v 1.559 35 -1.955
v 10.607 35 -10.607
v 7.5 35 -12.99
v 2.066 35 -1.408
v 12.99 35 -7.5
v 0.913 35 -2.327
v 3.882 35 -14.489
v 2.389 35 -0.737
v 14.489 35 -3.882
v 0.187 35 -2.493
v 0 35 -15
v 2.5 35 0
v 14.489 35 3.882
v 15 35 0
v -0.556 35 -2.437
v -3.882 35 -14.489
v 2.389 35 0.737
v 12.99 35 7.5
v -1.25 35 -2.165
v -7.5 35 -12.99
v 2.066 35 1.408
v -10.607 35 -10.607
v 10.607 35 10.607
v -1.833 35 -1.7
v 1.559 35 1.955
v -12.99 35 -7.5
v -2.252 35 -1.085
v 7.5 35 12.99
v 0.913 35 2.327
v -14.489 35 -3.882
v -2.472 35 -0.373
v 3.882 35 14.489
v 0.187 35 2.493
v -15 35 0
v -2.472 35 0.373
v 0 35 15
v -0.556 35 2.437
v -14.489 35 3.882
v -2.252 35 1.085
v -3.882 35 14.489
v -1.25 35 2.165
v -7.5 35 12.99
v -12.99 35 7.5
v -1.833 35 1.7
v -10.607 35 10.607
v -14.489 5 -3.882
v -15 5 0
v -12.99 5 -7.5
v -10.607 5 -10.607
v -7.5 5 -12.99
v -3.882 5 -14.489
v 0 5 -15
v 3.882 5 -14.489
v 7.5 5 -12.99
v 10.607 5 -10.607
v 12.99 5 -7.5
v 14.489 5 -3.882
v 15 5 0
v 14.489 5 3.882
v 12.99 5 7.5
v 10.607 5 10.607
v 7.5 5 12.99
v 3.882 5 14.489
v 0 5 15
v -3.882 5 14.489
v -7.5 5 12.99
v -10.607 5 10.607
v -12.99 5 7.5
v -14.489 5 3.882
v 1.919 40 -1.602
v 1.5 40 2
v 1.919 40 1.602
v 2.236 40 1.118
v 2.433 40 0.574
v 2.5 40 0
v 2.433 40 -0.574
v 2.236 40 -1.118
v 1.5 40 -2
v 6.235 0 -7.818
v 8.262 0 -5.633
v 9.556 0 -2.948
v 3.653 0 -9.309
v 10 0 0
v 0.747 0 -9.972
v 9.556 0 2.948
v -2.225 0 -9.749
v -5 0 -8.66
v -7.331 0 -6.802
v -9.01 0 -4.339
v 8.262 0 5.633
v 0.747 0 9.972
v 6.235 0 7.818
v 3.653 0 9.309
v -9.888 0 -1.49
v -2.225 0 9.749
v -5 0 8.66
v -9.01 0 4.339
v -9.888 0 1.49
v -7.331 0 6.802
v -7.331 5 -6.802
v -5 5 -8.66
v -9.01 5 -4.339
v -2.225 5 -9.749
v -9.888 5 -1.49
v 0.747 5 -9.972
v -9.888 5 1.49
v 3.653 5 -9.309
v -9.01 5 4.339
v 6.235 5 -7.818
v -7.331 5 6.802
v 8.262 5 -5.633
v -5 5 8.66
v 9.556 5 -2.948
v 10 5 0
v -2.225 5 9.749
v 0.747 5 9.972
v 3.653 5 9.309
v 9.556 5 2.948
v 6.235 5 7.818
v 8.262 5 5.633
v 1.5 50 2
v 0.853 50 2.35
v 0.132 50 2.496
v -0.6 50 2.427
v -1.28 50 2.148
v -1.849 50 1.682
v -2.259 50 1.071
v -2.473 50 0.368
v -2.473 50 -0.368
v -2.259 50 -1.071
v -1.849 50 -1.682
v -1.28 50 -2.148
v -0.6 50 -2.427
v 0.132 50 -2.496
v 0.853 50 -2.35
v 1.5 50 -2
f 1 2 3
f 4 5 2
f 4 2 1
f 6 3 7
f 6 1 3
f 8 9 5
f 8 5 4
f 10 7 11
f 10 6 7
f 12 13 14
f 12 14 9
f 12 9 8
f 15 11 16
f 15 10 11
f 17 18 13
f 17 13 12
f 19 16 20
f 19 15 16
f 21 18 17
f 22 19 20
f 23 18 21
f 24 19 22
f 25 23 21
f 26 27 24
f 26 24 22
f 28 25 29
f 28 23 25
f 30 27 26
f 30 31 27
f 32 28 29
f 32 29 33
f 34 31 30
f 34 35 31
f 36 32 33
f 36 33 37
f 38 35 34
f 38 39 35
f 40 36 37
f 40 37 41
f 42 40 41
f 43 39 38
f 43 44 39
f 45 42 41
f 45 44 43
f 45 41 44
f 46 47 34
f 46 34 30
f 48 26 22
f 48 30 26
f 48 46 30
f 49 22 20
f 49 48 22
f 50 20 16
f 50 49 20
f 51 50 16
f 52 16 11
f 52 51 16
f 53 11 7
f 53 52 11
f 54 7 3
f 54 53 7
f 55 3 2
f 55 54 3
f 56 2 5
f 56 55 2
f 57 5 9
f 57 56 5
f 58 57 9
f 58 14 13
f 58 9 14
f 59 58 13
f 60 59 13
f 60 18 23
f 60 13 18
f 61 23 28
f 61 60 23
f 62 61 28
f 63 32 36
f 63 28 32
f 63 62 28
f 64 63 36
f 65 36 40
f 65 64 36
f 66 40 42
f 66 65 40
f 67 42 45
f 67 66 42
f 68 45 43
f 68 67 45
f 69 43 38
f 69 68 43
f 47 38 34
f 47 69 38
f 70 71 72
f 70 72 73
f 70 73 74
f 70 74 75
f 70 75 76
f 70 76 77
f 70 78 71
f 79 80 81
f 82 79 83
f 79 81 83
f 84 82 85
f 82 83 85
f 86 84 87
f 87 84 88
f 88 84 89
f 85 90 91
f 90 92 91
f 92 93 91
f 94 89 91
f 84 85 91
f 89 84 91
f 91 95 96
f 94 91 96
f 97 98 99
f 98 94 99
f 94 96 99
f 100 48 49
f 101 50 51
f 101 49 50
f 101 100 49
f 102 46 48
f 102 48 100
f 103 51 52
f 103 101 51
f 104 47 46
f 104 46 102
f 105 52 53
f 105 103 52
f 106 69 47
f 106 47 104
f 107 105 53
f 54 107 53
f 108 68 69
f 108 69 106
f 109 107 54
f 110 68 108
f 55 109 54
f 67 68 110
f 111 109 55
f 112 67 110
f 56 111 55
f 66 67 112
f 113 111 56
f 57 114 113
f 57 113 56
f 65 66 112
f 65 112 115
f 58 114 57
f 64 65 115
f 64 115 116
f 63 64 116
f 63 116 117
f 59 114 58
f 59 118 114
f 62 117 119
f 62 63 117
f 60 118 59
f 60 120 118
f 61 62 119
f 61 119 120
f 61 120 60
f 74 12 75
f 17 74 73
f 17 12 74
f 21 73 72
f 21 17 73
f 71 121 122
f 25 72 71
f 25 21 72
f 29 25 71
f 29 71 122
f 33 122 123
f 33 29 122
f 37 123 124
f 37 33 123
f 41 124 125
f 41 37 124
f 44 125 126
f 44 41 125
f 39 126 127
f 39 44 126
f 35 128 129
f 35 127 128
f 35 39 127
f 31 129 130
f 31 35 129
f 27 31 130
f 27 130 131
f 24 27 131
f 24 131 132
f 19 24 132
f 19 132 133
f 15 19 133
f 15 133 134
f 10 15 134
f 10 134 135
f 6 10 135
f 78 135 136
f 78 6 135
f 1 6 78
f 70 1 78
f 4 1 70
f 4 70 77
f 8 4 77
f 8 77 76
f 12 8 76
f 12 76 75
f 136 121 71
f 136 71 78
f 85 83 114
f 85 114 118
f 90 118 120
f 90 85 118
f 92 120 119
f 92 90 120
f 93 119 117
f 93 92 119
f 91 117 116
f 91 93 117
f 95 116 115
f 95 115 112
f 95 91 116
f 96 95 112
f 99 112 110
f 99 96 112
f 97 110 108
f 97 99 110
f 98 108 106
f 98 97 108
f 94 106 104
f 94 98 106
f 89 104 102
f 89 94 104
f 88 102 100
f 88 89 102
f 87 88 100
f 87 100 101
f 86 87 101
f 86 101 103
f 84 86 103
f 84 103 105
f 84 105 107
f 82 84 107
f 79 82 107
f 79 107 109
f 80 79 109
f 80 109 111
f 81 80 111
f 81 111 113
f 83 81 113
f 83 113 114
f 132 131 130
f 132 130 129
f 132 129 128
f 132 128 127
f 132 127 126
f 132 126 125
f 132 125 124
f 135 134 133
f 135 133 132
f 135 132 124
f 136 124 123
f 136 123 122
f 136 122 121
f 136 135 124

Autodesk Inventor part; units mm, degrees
ref_plane "YZ Plane" through (0, 0, 0) normal (1, 0, 0) x (0, 1, 0)
ref_plane "XZ Plane" through (0, 0, 0) normal (0, 1, 0) x (-1, 0, 0)
ref_plane "XY Plane" through (0, 0, 0) normal (0, 0, 1) x (1, 0, 0)
sketch "Sketch1" plane through (0, 0, 0) normal (0, 1, 0) x (-1, 0, 0)
  circle A0 centre (0, 0) radius 15
  dimension "d0" = 30
extrude "Extrusion1" add sketch "Sketch1" along normal blind 35
sketch "Sketch2" plane through (0, 0, 0) normal (0, -1, 0) x (1, 0, 0)
  circle A0 centre (0, 0) radius 10
  circle A1 centre (0, 0) radius 15 projected
  dimension "d3" = 20
extrude "Extrusion2" cut sketch "Sketch2" against normal blind 5
sketch "Sketch3" plane through (0, 35, 0) normal (0, 1, 0) x (1, 0, 0)
  circle A0 centre (0, 0) radius 2.5
  dimension "d6" = 5
extrude "Extrusion3" add sketch "Sketch3" along normal blind 15
sketch "Sketch4" plane through (0, 50, 0) normal (0, 1, 0) x (1, 0, 0)
  circle A0 centre (0, 0) radius 2.5 projected
  line L0 (-1.5, -3.5) -> (1.5, -3.5)
  line L1 (1.5, -3.5) -> (1.5, 3.5)
  line L2 (1.5, 3.5) -> (-1.5, 3.5)
  line L3 (-1.5, 3.5) -> (-1.5, -3.5)
  circle A1 centre (0, 0) radius 2.5 projected
  line L4 (-1.5, -3.5) -> (1.5, 3.5) construction
  line L5 (1.5, -3.5) -> (-1.5, 3.5) construction
  point P0 (1.5, 2)
  point P1 (1.5, -2)
  dimension "d9" = 3
  dimension "d10" = 7
extrude "Extrusion4" cut sketch "Sketch4" against normal blind 10 contours A0 L1
properties part number "Motor"
